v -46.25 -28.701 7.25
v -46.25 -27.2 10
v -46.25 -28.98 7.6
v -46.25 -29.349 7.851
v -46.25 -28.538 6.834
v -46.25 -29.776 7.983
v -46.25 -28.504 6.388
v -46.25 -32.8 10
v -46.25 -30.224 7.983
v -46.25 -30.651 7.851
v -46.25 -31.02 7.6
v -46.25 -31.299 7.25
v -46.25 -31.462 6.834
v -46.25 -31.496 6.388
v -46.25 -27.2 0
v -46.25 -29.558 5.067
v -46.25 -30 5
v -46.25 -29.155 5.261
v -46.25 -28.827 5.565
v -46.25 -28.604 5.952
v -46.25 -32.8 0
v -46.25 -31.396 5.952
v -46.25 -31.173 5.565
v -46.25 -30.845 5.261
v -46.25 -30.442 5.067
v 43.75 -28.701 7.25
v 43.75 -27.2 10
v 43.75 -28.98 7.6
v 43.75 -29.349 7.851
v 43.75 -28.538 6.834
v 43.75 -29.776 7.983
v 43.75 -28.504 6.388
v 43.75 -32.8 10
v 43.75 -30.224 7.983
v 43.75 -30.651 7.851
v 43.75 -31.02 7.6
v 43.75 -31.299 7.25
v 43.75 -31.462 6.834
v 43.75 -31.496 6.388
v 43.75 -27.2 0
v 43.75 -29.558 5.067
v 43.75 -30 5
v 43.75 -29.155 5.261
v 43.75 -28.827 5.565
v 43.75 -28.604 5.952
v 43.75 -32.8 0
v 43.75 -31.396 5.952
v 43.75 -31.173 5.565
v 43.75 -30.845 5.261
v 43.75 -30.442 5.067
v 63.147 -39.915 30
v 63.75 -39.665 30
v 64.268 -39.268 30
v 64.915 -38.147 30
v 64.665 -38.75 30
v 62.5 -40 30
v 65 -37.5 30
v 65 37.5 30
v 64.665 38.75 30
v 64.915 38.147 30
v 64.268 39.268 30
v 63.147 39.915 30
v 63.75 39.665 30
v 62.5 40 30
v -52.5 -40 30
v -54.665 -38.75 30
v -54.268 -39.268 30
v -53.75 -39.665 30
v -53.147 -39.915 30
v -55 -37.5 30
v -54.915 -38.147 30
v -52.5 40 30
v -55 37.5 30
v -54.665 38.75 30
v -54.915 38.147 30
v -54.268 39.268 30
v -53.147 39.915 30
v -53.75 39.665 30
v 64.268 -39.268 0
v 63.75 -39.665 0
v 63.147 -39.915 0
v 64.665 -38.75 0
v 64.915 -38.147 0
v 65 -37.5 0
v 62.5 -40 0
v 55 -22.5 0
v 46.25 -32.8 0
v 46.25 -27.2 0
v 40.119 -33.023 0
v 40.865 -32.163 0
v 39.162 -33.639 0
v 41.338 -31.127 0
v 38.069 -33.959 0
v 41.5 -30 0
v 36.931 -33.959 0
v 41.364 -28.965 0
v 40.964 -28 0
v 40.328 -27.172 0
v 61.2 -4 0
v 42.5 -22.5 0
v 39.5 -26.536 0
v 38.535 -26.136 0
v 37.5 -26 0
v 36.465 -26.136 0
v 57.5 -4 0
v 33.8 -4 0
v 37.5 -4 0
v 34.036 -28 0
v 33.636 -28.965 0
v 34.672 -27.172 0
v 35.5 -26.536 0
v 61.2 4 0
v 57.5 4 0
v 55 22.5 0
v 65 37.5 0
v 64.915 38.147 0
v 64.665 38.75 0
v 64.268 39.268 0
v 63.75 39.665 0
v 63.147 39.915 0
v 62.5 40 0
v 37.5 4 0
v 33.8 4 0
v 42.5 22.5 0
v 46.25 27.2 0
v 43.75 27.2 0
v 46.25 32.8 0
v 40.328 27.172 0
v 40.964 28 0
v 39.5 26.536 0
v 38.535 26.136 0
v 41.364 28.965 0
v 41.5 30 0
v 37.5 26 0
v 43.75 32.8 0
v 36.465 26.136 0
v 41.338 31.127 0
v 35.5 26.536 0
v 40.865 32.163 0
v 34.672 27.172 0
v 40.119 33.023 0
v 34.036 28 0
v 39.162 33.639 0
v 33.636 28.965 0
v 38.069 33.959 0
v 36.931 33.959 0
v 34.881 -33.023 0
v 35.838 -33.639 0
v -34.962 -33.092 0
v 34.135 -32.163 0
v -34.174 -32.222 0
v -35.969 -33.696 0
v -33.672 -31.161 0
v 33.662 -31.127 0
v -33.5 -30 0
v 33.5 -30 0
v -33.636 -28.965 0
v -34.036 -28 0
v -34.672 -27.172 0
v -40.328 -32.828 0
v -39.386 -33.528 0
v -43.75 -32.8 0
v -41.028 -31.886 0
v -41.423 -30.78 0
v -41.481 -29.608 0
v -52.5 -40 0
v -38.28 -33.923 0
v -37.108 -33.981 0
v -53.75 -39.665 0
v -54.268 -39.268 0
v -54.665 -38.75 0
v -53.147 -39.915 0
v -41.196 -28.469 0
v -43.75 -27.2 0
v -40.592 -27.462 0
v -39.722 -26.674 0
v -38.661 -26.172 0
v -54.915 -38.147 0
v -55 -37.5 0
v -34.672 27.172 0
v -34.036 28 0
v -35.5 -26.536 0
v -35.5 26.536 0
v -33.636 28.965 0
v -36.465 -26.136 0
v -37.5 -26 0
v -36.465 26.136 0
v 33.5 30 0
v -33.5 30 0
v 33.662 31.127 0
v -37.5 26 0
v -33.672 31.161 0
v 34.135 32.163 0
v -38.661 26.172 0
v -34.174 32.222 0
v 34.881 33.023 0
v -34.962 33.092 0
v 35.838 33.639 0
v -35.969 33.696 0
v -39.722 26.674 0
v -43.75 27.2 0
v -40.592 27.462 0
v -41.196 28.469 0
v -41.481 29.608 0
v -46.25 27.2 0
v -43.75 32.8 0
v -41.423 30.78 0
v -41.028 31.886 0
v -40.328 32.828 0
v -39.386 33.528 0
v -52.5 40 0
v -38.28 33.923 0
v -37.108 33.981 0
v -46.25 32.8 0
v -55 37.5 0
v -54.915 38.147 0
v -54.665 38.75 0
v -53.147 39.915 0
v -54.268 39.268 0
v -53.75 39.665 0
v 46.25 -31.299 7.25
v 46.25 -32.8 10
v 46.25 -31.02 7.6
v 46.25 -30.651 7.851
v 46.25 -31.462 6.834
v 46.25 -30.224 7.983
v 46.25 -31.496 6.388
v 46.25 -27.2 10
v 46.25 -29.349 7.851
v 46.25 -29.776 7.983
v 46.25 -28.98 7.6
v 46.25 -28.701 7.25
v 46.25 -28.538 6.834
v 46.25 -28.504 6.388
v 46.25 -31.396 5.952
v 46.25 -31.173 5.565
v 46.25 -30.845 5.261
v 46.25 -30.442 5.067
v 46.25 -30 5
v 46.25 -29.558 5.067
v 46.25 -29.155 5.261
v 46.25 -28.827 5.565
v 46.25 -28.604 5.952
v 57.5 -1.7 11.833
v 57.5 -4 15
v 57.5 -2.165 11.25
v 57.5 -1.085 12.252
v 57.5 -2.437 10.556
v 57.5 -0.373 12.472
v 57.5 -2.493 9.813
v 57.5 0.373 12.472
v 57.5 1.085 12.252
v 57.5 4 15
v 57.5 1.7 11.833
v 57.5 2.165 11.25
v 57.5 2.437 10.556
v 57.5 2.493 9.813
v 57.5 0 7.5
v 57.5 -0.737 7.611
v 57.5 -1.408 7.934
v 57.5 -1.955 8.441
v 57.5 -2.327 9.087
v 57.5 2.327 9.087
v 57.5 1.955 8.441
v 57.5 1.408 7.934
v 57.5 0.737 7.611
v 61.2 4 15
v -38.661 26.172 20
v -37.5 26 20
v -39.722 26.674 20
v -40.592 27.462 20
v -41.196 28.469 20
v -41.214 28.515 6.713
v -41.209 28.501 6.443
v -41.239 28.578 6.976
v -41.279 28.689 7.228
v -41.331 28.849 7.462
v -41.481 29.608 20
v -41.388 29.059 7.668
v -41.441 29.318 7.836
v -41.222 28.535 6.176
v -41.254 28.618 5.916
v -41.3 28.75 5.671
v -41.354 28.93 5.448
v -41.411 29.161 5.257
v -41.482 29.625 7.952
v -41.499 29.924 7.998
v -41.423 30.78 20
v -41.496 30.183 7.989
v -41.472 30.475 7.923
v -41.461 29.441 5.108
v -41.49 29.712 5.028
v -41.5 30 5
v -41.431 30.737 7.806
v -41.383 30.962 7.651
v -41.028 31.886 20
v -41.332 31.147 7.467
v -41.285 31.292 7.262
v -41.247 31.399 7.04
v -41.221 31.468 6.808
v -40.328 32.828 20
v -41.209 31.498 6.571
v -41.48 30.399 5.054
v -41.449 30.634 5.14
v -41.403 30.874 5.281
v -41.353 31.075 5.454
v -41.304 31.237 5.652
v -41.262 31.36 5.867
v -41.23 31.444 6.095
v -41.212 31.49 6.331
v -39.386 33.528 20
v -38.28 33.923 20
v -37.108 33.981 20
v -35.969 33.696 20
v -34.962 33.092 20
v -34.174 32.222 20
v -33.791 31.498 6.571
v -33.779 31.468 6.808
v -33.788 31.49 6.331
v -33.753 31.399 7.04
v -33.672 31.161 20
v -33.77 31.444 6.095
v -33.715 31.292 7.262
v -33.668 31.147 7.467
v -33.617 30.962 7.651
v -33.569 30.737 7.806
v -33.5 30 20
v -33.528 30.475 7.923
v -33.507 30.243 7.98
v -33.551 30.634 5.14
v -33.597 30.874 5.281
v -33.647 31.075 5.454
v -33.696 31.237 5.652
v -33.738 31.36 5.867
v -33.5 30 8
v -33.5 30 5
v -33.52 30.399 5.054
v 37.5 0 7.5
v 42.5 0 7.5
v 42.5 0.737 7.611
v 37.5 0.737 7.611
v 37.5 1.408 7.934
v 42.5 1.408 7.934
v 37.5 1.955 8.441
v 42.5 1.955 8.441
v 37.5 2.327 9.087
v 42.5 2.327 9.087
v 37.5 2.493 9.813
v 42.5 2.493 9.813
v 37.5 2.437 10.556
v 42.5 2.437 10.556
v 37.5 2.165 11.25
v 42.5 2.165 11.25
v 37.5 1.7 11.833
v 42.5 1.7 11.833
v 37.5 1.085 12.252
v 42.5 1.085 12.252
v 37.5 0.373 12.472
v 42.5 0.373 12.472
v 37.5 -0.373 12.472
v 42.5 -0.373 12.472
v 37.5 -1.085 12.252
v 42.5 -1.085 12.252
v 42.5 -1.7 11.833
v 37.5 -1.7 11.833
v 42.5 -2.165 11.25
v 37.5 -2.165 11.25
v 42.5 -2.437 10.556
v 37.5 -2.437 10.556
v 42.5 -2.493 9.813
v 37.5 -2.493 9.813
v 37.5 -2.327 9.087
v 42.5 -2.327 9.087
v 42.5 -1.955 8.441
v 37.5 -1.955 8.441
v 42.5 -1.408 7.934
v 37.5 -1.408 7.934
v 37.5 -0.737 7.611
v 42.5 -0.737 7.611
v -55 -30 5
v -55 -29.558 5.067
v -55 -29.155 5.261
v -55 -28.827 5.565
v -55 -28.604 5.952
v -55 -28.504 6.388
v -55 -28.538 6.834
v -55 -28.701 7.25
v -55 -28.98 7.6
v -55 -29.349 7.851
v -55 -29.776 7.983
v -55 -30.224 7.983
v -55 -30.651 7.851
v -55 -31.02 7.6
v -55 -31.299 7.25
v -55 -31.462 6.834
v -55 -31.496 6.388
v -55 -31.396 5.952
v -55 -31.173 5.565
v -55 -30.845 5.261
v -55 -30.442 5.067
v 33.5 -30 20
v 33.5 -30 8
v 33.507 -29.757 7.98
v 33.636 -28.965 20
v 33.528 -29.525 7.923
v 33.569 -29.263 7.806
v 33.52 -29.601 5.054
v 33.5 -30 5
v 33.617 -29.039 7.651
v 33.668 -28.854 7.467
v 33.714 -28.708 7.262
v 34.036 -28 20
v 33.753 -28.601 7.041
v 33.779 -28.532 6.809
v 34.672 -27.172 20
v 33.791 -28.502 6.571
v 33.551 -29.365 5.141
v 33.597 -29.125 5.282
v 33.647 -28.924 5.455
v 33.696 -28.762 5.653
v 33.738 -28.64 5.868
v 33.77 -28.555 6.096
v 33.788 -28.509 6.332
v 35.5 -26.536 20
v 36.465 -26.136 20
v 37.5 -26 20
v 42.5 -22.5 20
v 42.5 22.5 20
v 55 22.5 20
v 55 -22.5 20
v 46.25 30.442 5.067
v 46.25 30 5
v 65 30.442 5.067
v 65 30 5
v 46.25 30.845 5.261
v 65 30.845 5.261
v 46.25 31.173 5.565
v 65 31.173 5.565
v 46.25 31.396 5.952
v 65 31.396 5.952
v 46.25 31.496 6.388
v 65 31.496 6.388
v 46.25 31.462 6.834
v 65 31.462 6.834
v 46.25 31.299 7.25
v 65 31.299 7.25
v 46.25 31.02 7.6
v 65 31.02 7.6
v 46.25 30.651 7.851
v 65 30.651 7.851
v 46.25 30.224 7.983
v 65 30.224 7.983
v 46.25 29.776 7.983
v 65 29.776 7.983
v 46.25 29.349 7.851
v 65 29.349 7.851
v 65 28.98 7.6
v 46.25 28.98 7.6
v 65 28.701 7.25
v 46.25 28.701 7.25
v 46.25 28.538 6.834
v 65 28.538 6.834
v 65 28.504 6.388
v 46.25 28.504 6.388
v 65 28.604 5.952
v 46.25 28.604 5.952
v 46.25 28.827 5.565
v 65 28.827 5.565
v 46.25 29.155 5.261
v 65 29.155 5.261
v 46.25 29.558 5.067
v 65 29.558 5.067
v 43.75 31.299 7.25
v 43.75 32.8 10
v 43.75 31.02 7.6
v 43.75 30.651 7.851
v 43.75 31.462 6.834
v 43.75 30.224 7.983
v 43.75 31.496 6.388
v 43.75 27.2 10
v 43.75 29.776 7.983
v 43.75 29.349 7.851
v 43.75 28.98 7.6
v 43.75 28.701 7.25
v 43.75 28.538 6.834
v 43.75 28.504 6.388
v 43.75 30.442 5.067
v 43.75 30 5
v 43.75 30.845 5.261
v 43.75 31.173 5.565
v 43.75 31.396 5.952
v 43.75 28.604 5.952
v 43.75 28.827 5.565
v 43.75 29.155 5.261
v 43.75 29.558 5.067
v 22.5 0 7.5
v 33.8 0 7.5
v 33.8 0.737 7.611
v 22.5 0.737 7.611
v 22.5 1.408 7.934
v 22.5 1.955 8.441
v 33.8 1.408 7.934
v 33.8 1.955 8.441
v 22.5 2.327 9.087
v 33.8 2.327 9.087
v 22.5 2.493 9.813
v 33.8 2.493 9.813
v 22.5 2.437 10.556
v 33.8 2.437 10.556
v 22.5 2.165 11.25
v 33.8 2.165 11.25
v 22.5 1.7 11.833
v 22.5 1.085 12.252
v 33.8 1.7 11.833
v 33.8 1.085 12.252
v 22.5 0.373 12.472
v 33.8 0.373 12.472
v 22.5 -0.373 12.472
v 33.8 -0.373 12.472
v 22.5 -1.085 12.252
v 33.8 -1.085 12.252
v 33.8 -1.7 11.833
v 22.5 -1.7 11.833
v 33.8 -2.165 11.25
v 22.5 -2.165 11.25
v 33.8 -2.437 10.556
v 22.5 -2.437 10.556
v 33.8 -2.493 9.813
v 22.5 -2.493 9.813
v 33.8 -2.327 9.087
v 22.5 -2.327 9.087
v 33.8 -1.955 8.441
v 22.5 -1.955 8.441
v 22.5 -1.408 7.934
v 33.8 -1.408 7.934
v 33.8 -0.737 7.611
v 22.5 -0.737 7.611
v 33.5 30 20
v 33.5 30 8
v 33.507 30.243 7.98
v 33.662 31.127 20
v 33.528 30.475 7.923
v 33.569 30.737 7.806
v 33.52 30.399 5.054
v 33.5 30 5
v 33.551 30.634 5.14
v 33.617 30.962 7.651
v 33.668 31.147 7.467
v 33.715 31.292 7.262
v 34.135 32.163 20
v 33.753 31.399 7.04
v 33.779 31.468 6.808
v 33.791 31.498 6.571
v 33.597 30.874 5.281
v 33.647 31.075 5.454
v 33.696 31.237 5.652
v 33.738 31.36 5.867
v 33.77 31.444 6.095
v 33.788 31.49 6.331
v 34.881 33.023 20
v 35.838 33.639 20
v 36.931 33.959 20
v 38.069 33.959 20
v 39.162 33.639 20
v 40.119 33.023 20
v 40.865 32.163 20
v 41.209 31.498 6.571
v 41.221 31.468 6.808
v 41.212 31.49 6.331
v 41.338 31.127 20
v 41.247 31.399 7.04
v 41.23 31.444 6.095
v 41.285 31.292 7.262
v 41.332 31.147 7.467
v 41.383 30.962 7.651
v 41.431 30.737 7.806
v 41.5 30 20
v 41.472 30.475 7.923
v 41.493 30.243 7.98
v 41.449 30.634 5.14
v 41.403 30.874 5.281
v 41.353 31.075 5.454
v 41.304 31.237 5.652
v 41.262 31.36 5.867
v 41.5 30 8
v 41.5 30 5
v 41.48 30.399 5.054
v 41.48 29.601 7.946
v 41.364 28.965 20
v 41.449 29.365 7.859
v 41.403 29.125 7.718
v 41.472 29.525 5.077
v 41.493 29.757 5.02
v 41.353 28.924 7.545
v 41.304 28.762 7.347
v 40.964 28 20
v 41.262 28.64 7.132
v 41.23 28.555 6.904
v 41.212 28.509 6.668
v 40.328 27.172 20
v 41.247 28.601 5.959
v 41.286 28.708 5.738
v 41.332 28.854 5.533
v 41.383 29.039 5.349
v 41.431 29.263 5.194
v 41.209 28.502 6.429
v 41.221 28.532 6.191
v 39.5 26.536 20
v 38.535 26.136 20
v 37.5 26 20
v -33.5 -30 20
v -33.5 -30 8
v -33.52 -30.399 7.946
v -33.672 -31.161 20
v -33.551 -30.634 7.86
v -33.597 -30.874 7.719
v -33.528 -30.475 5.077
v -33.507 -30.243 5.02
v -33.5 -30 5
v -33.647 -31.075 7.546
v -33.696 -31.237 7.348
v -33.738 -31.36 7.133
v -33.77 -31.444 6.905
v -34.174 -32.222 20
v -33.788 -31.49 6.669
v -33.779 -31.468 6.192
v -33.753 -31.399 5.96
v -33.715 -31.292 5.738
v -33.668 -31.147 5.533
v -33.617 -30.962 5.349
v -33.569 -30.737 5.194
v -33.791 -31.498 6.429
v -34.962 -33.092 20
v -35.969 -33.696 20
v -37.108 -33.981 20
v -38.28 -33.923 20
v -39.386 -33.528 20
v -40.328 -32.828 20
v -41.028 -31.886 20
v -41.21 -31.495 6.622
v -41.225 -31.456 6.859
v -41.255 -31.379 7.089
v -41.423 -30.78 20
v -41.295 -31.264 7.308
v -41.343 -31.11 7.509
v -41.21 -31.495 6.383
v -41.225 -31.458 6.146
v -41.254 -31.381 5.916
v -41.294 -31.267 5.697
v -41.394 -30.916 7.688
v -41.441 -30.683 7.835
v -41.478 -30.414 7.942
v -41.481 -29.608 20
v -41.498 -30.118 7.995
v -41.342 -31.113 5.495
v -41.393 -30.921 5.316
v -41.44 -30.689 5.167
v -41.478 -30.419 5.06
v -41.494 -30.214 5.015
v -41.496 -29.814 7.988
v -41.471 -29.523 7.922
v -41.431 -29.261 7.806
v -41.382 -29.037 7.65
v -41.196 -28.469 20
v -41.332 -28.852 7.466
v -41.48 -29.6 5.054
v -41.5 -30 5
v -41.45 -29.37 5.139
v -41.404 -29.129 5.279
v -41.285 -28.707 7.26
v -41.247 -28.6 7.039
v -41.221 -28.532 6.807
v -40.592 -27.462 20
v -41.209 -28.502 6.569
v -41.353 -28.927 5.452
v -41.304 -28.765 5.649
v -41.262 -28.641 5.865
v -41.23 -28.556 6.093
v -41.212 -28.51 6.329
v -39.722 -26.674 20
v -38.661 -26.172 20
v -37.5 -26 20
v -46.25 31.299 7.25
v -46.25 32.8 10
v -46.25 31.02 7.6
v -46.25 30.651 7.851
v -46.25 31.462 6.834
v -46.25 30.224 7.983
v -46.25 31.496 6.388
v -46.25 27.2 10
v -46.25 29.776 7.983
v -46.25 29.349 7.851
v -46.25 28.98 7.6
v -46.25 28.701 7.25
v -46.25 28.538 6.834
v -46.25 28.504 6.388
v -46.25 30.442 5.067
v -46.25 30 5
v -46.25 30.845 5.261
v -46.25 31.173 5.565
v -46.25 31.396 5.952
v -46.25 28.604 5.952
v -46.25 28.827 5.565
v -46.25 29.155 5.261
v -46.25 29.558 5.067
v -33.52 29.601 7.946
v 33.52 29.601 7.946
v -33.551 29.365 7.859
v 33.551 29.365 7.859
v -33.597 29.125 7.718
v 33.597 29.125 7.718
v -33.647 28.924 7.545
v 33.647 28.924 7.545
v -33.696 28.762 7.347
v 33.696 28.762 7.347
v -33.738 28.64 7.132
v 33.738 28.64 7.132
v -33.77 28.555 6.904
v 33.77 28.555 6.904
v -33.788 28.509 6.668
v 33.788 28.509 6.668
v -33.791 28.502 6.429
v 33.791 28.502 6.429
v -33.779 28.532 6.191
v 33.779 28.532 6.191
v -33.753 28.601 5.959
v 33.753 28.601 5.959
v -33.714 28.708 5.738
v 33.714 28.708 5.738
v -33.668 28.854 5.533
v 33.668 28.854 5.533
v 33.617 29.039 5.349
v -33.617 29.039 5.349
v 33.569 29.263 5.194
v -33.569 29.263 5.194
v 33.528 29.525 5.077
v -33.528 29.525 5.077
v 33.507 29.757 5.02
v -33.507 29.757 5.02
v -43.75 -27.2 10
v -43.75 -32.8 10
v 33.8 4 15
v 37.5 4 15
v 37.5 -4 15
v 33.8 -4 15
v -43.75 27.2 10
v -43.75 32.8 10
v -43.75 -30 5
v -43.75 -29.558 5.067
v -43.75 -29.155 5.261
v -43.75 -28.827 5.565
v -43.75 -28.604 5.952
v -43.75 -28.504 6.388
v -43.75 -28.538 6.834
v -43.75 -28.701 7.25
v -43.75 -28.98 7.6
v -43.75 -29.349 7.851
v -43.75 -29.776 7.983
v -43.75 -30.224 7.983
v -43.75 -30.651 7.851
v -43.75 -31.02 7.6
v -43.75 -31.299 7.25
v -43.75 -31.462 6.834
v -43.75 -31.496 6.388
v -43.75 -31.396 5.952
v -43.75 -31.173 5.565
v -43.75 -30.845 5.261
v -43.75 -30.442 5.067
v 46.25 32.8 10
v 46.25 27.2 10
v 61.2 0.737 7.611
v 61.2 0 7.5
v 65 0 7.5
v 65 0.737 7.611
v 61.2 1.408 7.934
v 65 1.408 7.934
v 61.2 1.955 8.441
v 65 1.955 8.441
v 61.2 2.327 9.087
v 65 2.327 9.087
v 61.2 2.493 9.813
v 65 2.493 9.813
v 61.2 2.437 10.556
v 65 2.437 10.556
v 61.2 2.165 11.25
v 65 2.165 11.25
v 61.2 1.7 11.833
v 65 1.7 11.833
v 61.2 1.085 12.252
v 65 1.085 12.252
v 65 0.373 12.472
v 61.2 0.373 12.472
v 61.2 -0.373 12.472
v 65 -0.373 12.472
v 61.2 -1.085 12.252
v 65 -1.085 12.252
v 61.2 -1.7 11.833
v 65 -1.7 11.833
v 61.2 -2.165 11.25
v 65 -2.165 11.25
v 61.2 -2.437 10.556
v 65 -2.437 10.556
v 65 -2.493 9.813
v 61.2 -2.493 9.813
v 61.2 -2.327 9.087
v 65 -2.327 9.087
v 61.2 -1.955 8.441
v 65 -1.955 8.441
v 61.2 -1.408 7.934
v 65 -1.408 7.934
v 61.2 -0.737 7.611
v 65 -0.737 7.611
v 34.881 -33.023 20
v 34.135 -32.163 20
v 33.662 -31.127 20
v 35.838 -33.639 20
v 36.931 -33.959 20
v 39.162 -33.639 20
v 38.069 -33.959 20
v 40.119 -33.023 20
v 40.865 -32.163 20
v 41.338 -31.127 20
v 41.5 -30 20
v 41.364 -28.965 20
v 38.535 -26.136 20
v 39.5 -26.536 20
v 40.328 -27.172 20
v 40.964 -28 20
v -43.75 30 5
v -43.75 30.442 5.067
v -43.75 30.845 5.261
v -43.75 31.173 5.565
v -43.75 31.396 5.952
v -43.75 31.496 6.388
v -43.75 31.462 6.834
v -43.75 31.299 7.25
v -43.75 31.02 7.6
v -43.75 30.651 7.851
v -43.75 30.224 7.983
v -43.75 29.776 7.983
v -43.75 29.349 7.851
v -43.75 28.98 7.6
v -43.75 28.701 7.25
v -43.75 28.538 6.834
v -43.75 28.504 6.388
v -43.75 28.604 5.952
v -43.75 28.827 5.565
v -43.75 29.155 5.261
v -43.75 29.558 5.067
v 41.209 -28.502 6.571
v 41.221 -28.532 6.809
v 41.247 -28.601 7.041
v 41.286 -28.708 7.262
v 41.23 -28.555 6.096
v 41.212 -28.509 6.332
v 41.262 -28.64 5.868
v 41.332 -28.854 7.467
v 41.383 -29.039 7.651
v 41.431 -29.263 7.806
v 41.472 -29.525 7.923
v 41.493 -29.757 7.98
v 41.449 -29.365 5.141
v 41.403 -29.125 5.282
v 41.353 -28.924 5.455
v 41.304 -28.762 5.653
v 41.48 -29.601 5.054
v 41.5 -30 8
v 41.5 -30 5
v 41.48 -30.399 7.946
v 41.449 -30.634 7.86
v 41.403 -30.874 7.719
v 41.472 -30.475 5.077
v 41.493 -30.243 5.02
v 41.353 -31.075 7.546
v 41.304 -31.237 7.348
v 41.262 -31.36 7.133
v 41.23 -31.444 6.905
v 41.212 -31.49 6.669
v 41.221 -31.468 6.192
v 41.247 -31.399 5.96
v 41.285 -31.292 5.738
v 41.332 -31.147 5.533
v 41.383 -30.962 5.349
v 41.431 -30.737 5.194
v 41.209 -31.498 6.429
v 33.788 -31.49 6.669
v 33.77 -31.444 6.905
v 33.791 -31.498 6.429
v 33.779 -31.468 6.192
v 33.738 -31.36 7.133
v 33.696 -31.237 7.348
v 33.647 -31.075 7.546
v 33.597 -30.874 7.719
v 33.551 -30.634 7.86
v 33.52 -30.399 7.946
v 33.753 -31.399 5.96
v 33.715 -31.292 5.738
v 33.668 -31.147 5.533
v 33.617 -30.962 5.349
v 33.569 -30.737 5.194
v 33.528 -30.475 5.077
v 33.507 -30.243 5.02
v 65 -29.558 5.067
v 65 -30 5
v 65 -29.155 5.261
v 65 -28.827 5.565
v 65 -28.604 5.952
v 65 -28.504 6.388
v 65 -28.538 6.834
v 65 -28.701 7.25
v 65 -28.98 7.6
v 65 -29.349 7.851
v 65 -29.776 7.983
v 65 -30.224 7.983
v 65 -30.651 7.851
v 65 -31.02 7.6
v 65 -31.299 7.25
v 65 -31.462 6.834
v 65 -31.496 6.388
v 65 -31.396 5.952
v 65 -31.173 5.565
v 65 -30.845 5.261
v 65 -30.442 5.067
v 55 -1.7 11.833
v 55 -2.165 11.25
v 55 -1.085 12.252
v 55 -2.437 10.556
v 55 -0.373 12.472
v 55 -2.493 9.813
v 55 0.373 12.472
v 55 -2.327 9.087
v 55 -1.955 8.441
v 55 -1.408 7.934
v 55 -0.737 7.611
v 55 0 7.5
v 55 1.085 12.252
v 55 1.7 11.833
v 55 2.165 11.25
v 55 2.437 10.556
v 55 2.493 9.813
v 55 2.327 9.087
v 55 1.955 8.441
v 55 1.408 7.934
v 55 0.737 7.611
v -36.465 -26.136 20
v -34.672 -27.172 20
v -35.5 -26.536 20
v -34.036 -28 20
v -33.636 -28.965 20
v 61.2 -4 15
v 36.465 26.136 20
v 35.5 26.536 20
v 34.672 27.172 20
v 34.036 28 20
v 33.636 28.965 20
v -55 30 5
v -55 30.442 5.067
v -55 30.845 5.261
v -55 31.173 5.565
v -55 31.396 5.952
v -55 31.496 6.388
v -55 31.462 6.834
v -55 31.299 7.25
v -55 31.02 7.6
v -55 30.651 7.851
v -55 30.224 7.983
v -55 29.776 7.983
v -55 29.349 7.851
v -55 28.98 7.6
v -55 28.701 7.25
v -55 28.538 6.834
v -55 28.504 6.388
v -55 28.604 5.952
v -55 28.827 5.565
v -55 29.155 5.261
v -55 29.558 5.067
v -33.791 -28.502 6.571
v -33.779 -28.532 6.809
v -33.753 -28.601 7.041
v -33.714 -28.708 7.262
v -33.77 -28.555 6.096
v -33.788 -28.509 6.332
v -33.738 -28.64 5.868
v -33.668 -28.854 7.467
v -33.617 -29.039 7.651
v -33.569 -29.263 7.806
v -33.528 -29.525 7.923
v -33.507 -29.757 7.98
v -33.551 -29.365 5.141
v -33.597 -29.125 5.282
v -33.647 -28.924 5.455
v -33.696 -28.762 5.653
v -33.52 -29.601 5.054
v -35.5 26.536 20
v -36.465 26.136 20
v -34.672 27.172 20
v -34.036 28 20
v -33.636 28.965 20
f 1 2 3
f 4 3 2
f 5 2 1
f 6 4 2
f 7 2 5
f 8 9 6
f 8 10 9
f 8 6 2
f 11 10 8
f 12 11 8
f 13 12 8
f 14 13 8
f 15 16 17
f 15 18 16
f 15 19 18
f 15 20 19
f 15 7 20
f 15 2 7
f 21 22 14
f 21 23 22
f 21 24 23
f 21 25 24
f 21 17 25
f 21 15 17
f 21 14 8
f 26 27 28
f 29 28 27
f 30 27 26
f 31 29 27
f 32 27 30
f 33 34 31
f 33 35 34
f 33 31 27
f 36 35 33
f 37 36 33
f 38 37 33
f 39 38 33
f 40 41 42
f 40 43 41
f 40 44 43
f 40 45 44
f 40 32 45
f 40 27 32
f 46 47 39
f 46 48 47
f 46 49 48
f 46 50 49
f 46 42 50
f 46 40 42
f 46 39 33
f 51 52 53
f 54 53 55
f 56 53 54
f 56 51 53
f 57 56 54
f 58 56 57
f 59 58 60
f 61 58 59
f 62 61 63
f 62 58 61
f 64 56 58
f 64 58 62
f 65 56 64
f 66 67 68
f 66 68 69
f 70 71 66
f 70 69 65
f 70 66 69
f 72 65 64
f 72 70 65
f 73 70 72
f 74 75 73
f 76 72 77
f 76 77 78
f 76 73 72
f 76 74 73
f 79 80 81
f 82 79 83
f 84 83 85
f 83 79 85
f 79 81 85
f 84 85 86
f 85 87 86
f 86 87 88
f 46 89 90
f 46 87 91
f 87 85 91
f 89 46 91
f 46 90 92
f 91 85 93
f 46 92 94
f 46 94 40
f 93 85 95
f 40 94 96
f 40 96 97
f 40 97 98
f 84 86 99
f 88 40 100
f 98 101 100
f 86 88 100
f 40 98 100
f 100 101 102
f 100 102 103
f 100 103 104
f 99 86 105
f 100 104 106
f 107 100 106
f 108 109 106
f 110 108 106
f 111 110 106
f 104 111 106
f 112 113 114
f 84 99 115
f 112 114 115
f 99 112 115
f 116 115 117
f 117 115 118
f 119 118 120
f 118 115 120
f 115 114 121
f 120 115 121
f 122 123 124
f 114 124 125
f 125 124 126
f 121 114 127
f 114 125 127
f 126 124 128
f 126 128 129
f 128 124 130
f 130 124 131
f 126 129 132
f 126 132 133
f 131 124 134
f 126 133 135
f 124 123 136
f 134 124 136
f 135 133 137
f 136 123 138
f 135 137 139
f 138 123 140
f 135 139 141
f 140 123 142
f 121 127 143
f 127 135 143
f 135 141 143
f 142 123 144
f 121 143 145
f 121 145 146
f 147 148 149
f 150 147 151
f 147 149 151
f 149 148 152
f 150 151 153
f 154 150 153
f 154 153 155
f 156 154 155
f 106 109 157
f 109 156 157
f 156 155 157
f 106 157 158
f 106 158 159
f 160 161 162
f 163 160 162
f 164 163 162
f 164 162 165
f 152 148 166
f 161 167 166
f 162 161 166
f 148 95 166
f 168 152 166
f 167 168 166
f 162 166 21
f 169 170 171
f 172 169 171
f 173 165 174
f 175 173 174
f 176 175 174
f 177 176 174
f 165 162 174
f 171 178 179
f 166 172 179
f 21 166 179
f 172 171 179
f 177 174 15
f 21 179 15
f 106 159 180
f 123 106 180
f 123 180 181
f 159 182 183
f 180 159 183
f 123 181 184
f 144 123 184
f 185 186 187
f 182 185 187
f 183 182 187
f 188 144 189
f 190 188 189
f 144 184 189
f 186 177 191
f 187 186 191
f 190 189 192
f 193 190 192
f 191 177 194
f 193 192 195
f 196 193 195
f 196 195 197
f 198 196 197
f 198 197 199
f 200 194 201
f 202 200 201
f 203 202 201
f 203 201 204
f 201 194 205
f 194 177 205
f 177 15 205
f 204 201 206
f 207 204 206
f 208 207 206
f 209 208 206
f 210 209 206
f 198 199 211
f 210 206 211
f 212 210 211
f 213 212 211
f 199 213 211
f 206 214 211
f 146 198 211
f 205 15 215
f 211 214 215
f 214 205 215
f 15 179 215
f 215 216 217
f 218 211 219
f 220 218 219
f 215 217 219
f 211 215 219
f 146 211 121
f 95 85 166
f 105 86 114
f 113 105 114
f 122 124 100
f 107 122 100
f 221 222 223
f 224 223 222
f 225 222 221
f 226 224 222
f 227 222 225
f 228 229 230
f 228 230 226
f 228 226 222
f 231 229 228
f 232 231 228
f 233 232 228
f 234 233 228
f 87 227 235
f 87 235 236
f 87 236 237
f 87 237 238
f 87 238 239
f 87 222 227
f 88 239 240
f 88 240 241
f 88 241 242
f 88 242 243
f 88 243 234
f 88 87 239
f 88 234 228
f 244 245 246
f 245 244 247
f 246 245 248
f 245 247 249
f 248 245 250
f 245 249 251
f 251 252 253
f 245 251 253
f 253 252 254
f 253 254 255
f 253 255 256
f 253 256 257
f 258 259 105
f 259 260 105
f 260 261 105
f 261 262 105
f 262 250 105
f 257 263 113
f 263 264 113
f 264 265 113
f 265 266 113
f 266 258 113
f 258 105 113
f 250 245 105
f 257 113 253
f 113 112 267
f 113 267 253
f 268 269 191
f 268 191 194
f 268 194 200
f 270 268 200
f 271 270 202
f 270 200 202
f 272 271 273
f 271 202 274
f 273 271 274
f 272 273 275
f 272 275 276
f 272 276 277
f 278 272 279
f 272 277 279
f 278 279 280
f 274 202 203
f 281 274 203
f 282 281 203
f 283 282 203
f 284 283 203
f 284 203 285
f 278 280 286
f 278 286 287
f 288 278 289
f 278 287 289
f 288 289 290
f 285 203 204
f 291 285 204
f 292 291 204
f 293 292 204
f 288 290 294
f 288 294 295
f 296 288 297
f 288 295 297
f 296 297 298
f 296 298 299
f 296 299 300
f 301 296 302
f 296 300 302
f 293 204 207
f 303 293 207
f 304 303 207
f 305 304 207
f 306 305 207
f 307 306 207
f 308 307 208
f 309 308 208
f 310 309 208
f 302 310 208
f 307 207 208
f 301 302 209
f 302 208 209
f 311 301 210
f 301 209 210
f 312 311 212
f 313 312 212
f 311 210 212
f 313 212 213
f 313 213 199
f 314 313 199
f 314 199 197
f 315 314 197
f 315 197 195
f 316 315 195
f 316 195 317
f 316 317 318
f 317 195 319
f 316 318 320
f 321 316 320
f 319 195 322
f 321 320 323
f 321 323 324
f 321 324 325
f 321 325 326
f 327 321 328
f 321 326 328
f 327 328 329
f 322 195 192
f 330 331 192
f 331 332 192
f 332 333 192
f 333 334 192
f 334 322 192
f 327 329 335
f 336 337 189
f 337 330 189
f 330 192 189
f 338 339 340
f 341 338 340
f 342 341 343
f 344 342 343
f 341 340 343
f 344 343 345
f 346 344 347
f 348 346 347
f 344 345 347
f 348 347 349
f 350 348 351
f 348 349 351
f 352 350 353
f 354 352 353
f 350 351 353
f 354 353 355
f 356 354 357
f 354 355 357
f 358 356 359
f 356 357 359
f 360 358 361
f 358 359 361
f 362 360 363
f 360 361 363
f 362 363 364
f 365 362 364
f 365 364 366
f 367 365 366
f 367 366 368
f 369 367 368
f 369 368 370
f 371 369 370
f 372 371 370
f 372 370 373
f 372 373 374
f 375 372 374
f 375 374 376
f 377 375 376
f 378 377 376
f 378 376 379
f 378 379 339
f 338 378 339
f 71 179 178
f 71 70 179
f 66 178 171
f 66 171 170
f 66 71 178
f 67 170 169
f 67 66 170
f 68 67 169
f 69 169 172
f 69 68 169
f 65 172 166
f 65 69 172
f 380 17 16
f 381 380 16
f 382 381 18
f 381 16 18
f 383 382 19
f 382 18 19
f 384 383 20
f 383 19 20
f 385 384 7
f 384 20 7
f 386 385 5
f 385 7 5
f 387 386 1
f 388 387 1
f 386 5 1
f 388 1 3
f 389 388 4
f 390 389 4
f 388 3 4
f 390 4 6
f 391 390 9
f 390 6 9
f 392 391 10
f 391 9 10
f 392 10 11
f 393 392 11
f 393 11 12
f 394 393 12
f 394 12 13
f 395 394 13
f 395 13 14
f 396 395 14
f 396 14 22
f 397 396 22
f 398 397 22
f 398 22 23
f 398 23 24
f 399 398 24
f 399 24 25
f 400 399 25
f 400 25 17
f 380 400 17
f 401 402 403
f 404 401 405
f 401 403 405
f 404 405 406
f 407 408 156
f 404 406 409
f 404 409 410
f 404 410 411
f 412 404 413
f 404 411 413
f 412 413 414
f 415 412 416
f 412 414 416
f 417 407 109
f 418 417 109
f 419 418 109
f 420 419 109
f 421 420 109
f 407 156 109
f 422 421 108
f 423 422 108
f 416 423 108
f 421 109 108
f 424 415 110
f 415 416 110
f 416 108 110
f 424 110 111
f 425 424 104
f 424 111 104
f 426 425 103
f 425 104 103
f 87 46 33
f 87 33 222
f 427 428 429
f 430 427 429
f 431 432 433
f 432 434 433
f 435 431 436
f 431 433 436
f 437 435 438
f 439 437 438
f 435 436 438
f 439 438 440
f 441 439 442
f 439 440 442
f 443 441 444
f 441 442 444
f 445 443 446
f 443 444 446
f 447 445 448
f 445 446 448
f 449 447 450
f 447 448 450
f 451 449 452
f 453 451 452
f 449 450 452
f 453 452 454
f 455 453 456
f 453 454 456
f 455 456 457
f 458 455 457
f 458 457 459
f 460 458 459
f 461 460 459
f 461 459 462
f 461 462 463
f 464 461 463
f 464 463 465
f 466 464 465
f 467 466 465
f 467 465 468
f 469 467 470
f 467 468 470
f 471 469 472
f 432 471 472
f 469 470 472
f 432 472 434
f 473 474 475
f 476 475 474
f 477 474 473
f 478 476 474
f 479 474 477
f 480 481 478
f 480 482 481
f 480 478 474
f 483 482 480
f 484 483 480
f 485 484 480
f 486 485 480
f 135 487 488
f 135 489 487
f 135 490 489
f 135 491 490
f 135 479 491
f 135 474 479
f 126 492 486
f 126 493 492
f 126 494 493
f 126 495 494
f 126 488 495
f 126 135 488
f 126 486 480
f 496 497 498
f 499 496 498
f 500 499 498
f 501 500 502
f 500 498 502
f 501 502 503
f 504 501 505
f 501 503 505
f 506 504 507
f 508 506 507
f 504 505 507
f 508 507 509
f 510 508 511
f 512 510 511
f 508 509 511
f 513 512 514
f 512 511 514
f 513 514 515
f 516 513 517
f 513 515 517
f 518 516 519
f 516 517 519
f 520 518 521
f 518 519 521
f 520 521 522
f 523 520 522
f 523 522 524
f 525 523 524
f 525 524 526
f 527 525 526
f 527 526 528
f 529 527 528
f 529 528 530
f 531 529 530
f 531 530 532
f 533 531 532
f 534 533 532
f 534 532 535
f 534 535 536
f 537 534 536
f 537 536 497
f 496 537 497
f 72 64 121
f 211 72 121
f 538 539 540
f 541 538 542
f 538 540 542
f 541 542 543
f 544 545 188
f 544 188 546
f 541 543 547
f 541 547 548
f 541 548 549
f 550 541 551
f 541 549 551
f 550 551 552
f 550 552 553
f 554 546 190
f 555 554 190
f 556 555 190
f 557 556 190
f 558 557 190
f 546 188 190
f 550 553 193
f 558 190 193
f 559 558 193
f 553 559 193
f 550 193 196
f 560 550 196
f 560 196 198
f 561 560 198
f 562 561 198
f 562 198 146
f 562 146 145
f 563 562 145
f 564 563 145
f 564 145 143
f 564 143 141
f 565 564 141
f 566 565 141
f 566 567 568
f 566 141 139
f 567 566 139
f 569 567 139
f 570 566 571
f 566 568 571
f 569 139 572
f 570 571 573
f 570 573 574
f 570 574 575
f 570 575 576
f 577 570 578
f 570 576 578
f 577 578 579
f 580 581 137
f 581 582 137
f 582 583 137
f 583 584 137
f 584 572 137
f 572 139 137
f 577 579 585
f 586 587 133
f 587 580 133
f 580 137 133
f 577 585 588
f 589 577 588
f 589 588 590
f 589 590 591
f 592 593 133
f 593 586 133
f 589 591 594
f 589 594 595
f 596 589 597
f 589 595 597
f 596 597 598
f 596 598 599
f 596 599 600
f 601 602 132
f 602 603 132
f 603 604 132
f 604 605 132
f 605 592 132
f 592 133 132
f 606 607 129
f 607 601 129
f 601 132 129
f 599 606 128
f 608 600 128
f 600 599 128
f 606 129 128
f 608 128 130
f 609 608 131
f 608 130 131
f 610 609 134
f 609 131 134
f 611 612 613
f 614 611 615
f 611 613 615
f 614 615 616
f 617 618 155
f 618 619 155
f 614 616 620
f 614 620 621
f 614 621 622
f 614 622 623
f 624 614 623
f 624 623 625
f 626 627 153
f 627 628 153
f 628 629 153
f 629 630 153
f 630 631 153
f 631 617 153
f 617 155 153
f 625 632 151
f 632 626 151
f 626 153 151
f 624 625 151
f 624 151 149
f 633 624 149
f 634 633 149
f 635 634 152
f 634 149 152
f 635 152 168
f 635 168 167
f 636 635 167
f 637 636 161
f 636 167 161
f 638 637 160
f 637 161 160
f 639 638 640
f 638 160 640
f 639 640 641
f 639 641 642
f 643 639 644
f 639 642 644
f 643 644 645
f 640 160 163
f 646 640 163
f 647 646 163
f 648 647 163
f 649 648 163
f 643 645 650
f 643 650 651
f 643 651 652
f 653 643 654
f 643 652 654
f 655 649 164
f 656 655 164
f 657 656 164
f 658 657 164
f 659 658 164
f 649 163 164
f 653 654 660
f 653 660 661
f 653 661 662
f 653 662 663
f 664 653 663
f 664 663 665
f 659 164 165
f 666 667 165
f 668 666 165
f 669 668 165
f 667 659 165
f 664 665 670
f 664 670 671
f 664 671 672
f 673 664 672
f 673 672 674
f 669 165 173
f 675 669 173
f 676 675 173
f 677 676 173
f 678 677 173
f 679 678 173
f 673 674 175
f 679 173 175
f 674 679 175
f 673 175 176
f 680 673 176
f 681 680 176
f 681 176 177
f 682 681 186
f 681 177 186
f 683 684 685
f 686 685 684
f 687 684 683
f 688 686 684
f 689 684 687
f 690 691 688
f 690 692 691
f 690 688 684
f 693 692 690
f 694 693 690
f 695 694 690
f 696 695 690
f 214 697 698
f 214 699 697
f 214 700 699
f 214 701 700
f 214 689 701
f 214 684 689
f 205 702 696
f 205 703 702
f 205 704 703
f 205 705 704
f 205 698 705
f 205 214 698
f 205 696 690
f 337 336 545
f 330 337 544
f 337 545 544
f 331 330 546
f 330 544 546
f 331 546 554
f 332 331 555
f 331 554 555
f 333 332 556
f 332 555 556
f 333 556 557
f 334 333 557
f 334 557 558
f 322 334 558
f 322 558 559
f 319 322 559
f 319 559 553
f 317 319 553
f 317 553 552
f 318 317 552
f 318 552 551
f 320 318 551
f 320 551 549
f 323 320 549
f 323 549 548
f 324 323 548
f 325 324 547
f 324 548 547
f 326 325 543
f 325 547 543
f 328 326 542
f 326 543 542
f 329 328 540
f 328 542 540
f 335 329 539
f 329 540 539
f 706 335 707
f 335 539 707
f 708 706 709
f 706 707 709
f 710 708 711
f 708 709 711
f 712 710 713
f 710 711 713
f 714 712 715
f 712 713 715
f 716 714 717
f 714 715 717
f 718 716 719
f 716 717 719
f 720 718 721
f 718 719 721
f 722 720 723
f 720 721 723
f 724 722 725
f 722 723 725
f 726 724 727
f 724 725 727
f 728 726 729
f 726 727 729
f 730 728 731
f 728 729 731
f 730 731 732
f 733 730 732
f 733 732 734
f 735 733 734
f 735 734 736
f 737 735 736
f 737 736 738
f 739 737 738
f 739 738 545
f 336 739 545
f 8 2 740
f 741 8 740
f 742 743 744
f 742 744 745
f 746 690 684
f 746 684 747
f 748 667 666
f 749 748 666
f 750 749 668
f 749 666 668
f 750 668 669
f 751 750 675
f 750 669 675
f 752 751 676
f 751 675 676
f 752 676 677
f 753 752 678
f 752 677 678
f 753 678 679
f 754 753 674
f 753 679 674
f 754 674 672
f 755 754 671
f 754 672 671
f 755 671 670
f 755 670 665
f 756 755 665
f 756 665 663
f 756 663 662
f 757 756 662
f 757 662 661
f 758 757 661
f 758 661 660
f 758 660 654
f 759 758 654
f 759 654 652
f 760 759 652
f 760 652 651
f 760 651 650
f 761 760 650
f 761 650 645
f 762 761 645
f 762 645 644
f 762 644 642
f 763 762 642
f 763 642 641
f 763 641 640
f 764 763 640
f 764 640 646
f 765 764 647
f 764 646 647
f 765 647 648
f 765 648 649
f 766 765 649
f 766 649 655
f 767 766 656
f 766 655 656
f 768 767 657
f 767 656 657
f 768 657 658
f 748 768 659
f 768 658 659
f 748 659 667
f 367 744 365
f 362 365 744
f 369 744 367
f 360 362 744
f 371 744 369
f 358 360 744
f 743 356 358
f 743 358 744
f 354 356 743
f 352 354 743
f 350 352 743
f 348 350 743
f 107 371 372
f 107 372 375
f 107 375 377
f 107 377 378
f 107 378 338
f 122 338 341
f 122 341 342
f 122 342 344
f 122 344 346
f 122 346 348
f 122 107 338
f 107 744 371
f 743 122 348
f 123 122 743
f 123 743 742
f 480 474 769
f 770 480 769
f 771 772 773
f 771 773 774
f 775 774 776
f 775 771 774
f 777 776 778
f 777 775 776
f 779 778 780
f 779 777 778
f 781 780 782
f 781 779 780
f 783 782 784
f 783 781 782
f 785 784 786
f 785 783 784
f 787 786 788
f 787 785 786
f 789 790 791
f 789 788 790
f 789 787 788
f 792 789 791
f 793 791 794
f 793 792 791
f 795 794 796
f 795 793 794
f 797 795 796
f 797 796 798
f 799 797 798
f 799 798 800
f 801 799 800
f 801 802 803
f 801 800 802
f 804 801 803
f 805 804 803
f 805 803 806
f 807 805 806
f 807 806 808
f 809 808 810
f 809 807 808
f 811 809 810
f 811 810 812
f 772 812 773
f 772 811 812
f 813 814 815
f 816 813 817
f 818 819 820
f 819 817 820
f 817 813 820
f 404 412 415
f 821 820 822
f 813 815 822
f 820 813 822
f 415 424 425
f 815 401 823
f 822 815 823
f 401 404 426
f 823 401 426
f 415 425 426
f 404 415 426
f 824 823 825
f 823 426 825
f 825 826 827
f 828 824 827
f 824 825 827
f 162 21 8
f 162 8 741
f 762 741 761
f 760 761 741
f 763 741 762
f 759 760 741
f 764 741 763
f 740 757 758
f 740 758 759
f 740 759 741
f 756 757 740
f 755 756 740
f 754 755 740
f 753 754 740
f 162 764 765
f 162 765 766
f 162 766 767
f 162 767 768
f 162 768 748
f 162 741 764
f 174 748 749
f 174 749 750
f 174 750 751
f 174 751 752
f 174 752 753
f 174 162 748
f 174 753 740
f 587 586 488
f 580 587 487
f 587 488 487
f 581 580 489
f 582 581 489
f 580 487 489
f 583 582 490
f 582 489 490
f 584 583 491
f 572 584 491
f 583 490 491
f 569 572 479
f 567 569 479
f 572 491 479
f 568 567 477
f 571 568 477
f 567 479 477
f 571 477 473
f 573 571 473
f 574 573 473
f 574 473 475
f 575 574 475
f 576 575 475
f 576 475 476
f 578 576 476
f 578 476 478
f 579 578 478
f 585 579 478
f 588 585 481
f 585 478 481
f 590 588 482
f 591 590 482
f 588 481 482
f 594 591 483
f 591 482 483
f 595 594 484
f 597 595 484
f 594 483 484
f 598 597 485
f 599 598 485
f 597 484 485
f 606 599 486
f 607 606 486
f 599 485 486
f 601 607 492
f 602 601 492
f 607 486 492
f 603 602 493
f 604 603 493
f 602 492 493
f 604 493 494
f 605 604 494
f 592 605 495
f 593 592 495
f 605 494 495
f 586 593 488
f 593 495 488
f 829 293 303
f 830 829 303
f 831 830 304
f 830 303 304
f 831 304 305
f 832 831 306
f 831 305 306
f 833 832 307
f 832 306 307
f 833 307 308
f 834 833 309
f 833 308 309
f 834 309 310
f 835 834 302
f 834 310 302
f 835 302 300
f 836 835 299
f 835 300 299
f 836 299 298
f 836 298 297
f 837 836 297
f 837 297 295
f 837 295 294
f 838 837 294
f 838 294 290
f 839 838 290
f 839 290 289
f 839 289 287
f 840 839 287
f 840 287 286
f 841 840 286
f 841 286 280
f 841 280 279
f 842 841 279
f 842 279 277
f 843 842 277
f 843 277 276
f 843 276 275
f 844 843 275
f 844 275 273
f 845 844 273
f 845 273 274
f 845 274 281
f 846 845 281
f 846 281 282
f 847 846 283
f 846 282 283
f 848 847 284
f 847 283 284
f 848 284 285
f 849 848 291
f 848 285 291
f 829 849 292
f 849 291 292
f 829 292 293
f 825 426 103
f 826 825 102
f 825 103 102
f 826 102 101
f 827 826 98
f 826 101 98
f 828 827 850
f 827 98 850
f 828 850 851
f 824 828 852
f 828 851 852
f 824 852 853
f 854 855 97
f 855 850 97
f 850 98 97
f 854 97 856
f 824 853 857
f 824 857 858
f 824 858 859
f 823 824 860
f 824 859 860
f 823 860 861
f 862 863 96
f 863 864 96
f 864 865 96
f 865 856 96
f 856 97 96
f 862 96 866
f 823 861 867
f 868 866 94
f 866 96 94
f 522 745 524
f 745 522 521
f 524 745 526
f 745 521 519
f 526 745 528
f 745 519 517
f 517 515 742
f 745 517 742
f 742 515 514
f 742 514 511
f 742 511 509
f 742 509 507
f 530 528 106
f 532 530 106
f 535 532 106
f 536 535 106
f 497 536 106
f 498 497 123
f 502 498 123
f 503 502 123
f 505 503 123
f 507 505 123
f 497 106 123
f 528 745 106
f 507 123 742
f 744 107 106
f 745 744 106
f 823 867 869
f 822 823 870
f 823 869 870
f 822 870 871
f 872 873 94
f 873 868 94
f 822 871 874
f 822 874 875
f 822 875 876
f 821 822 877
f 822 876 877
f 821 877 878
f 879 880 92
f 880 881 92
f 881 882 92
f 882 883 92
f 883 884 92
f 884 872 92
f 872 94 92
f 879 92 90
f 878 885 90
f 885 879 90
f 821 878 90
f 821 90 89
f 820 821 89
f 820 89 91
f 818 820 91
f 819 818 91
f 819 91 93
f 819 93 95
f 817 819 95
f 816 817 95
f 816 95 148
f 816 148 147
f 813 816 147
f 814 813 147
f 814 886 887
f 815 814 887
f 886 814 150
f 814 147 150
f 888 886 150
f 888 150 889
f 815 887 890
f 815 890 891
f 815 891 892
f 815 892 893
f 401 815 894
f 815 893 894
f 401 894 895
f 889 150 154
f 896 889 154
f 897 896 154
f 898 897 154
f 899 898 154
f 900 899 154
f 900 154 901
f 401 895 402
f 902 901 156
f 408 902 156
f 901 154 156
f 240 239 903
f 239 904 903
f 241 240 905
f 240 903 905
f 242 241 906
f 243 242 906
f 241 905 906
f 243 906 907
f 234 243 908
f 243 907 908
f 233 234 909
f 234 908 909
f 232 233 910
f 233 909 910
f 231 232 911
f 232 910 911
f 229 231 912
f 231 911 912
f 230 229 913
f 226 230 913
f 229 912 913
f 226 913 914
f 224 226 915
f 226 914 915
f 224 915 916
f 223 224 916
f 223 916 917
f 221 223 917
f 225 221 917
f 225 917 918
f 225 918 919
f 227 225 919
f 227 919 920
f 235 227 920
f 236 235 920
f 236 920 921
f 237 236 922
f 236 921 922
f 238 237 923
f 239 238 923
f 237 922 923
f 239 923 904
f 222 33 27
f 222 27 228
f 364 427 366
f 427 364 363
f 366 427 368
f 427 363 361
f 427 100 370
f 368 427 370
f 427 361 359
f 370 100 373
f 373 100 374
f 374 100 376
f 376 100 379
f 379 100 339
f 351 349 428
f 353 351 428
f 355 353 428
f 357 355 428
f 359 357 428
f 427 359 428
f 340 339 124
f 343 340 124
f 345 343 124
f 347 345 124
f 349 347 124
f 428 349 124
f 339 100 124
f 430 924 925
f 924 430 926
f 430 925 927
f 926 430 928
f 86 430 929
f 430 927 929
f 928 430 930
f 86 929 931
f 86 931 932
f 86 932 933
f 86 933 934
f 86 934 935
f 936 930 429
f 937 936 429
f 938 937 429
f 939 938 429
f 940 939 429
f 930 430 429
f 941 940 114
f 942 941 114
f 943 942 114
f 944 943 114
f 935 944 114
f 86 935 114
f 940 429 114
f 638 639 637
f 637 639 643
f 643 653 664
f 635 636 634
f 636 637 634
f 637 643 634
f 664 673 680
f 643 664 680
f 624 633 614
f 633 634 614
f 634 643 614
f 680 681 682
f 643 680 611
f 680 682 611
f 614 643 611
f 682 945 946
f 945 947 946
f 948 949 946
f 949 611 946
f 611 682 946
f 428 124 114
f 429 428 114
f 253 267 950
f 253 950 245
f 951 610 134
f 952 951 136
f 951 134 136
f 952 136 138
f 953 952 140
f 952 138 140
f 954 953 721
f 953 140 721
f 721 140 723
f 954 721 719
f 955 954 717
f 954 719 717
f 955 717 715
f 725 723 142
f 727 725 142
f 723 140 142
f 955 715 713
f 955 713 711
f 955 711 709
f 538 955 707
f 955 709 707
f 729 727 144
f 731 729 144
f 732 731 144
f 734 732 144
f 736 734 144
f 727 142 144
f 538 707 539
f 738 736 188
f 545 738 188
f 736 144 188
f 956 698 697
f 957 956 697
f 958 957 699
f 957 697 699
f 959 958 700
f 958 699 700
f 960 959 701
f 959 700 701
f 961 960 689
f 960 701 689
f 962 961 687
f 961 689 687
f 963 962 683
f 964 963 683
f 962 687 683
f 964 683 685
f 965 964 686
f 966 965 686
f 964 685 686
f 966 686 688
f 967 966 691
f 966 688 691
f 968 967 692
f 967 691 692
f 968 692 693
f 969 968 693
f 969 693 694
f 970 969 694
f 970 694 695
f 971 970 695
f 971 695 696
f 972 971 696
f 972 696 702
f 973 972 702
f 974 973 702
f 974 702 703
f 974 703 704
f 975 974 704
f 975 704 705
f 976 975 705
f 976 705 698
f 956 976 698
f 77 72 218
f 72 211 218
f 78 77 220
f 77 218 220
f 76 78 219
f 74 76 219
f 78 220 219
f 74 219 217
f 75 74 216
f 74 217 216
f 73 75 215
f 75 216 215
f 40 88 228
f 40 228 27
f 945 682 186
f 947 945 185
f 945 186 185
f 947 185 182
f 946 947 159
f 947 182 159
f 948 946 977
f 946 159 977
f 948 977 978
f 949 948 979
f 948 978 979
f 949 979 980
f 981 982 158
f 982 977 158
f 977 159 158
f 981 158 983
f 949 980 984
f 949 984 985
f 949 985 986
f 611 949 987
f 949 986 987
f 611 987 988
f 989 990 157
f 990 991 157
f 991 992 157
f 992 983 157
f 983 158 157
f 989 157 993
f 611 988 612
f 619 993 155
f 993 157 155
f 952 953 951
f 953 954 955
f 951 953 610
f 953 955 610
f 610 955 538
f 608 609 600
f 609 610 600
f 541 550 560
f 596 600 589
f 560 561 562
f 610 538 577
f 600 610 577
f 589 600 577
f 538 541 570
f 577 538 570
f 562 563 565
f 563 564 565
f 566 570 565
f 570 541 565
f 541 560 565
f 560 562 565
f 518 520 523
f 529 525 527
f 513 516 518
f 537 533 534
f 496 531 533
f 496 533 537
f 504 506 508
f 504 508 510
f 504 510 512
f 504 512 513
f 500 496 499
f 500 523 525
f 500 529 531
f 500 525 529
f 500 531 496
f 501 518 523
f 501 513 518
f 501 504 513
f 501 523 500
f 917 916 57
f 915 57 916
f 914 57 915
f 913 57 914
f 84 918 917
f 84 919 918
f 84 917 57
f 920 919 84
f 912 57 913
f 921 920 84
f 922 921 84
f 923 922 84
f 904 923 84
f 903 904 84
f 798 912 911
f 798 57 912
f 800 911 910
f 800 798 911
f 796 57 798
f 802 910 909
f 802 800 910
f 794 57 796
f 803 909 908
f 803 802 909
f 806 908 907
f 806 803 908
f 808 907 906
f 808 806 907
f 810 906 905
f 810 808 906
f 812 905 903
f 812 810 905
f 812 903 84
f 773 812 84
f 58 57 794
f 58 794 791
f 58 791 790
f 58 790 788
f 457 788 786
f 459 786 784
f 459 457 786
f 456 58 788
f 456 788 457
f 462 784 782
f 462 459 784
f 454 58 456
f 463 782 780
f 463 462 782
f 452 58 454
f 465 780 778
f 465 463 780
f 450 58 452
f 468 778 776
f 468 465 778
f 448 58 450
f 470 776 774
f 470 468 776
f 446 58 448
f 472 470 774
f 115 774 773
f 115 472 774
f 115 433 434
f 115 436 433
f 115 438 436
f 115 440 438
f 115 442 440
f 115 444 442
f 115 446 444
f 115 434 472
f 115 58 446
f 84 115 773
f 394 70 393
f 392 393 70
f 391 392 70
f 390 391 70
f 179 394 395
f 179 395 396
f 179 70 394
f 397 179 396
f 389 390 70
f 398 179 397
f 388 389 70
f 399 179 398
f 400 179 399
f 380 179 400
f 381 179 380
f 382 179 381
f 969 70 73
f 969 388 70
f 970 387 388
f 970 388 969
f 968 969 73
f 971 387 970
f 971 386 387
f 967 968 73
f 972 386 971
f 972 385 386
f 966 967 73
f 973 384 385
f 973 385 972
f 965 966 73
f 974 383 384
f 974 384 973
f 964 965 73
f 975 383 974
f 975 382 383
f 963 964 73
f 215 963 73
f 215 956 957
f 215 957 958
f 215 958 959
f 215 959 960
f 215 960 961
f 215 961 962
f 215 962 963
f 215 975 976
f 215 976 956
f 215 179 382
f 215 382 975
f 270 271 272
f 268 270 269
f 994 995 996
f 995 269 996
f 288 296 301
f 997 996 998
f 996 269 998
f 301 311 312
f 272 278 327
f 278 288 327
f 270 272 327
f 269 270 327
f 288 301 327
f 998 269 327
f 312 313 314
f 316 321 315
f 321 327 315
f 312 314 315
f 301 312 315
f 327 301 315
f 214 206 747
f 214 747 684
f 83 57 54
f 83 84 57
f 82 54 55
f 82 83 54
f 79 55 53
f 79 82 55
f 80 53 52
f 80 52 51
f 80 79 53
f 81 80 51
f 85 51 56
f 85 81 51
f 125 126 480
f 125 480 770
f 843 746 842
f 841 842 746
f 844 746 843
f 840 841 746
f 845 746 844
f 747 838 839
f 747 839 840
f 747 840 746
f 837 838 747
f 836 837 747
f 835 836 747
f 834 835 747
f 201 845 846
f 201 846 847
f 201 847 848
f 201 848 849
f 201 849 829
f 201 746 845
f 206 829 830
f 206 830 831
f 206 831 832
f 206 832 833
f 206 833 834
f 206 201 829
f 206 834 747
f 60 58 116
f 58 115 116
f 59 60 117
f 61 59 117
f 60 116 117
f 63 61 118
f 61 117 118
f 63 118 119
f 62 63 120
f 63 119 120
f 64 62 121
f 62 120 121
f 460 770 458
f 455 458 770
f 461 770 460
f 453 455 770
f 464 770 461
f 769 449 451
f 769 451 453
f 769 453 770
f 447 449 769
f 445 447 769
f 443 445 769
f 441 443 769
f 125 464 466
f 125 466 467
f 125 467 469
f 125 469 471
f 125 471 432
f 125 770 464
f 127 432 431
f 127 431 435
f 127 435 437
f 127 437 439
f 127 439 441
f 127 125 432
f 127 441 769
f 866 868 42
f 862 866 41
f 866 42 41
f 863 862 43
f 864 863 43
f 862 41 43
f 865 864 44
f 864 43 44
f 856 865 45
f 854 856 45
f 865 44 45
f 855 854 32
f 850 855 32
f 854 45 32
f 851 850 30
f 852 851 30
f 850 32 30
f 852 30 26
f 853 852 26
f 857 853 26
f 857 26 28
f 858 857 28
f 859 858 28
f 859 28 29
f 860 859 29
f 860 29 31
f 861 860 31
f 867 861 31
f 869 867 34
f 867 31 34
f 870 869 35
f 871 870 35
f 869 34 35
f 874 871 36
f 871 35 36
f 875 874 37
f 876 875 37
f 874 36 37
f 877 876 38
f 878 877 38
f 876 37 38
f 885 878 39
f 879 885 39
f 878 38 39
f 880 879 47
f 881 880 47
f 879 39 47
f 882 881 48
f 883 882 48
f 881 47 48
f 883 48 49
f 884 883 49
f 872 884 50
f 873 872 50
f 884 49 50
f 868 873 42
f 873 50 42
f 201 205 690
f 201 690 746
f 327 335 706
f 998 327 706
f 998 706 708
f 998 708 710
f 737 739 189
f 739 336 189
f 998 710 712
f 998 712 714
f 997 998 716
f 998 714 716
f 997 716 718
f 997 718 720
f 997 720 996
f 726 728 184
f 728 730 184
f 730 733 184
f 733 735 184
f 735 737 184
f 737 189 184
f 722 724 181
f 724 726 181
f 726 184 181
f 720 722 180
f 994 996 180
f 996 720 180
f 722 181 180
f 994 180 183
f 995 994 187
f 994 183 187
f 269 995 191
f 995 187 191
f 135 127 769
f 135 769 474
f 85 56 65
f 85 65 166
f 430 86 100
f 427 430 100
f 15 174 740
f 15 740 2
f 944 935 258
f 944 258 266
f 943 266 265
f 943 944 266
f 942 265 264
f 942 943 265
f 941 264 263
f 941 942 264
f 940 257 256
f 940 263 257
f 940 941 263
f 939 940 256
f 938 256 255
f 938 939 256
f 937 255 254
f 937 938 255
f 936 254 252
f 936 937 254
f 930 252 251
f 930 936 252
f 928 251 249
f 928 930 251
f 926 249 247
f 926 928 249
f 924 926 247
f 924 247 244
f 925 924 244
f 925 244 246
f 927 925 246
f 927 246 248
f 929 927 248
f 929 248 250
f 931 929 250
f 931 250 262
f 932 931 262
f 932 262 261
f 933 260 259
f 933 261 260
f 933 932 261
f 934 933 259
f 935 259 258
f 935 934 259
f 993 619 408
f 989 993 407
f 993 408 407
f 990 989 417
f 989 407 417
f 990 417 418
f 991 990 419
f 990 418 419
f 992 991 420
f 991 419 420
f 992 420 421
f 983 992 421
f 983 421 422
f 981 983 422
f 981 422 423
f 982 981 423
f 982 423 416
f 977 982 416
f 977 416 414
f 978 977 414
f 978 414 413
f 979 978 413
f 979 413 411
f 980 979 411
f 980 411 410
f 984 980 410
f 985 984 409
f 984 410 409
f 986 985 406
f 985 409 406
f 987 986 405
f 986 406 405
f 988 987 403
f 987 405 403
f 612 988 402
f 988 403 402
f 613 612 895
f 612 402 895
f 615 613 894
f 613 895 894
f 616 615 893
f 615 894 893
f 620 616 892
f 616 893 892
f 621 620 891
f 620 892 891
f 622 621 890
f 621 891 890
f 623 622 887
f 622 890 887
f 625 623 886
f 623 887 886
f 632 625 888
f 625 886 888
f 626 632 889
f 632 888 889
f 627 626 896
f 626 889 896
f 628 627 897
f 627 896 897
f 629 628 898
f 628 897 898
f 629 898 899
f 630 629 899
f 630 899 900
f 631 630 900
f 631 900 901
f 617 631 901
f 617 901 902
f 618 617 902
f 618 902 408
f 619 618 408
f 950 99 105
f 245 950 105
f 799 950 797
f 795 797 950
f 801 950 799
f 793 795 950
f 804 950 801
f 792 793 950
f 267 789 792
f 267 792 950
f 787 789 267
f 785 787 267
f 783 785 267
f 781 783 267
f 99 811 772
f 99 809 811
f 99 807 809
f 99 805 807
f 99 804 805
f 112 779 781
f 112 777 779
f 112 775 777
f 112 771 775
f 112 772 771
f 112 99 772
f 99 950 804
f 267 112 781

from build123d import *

# Parameters (mm, degrees)
SKETCH2_W               = 75
SKETCH2_H               = 45
BOSS_EXTRUDE1_DEPTH     = 20
SKETCH3_W               = 110
SKETCH3_H               = 80
BOSS_EXTRUDE2_DEPTH     = 10
SKETCH4_W               = 1.25
SKETCH4_H               = 2.8
CUT_EXTRUDE1_DEPTH      = 10
SKETCH5_W               = 30
SKETCH5_H               = 80
BOSS_EXTRUDE4_DEPTH     = 10
SKETCH8_R               = 1.5
CUT_EXTRUDE2_DEPTH      = 120
SKETCH9_R               = 2.5
CUT_EXTRUDE3_DEPTH      = 40
CUT_EXTRUDE3_DEPTH_BACK = 20
SKETCH10_W              = 3.7
SKETCH10_H              = 8
CUT_EXTRUDE4_DEPTH      = 15
FILLET1_R               = 2.5


with BuildPart() as part:
    # Sketch2 → Boss-Extrude1 (new body)
    with BuildSketch(Plane.XY):
        Polygon((42.5, -22.5), (42.5, 22.5), (55, 22.5), (55, 40), (-55, 40), (-55, -40), (55, -40), (55, -22.5), align=None)
        with BuildLine():
            Line((-37.5, -22.5), (-37.5, 22.5))
            Line((-37.5, 22.5), (-37.5, 26))
            ThreePointArc((-37.5, 26), (-40.328427125, 32.828427125), (-33.5, 30))
            Line((-33.5, 30), (33.5, 30))
            ThreePointArc((33.5, 30), (37.5, 34), (41.5, 30))
            ThreePointArc((41.5, 30), (40.328427125, 27.171572875), (37.5, 26))
            Line((37.5, 26), (37.5, 22.5))
            Line((37.5, 22.5), (37.5, -22.5))
            Line((37.5, -22.5), (37.5, -26))
            ThreePointArc((37.5, -26), (40.328427125, -27.171572875), (41.5, -30))
            ThreePointArc((41.5, -30), (37.5, -34), (33.5, -30))
            Line((33.5, -30), (-33.5, -30))
            ThreePointArc((-33.5, -30), (-40.328427125, -32.828427125), (-37.5, -26))
            Line((-37.5, -26), (-37.5, -22.5))
        make_face(mode=Mode.SUBTRACT)
        with BuildLine():
            Line((-37.5, 26), (-37.5, 22.5))
            Line((-37.5, 22.5), (37.5, 22.5))
            Line((37.5, 22.5), (37.5, 26))
            ThreePointArc((37.5, 26), (34.671572875, 27.171572875), (33.5, 30))
            Line((33.5, 30), (-33.5, 30))
            ThreePointArc((-33.5, 30), (-34.671572875, 27.171572875), (-37.5, 26))
        make_face()
        Rectangle(SKETCH2_W, SKETCH2_H)
        with BuildLine():
            Line((37.5, -22.5), (-37.5, -22.5))
            Line((-37.5, -22.5), (-37.5, -26))
            ThreePointArc((-37.5, -26), (-34.671572875, -27.171572875), (-33.5, -30))
            Line((-33.5, -30), (33.5, -30))
            ThreePointArc((33.5, -30), (34.671572875, -27.171572875), (37.5, -26))
            Line((37.5, -26), (37.5, -22.5))
        make_face()
    extrude(amount=BOSS_EXTRUDE1_DEPTH)

    # Sketch3 → Boss-Extrude2 (add)
    with BuildSketch(Plane.XY.offset(20)):
        Rectangle(SKETCH3_W, SKETCH3_H)
    extrude(amount=BOSS_EXTRUDE2_DEPTH)

    # Sketch4 → Cut-Extrude1 (cut)
    with BuildSketch(Plane.XY):
        Polygon((43.75, 32.8), (43.75, 30), (45, 30), (45, 27.2), (46.25, 27.2), (46.25, 32.8), align=None)
        with Locations((44.375, 28.6)):
            Rectangle(SKETCH4_W, SKETCH4_H)
        Polygon((-45, 27.2), (-45, 30), (-43.75, 30), (-43.75, 32.8), (-46.25, 32.8), (-46.25, 27.2), align=None)
        with Locations((-44.375, 28.6)):
            Rectangle(SKETCH4_W, SKETCH4_H)
        with Locations((-44.375, -28.6)):
            Rectangle(SKETCH4_W, SKETCH4_H)
        Polygon((-45, -30), (-45, -27.2), (-46.25, -27.2), (-46.25, -32.8), (-43.75, -32.8), (-43.75, -30), align=None)
        Polygon((46.25, -27.2), (45, -27.2), (45, -30), (43.75, -30), (43.75, -32.8), (46.25, -32.8), align=None)
        with Locations((44.375, -28.6)):
            Rectangle(SKETCH4_W, SKETCH4_H)
    extrude(amount=CUT_EXTRUDE1_DEPTH, mode=Mode.SUBTRACT)

    # Sketch5 → Boss-Extrude4 (add)
    with BuildSketch(Plane(origin=(55, 0, 0), x_dir=(0, 0, -1), z_dir=(1, 0, 0))):
        with Locations((-15, 0)):
            Rectangle(SKETCH5_W, SKETCH5_H)
    extrude(amount=BOSS_EXTRUDE4_DEPTH)

    # Sketch8 → Cut-Extrude2 (cut)
    with BuildSketch(Plane(origin=(65, 0, 0), x_dir=(0, 0, -1), z_dir=(1, 0, 0))):
        with Locations((-6.5, 30)):
            Circle(SKETCH8_R)
        with Locations((-6.5, -30)):
            Circle(SKETCH8_R)
    extrude(amount=-CUT_EXTRUDE2_DEPTH, mode=Mode.SUBTRACT)

    # Sketch9 → Cut-Extrude3 (cut, two sides)
    with BuildSketch(Plane(origin=(42.5, 0, 0), x_dir=(0, 0, -1), z_dir=(1, 0, 0))) as cut_extrude3_sk:
        with Locations((-10, 0)):
            Circle(SKETCH9_R)
    extrude(amount=CUT_EXTRUDE3_DEPTH, mode=Mode.SUBTRACT)
    extrude(cut_extrude3_sk.sketch, amount=-CUT_EXTRUDE3_DEPTH_BACK, mode=Mode.SUBTRACT)

    # Sketch10 → Cut-Extrude4 (cut)
    with BuildSketch(Plane(origin=(0, 0, 0), x_dir=(-1, 0, 0), z_dir=(0, 0, -1))):
        with Locations((-35.65, 0)):
            Rectangle(SKETCH10_W, SKETCH10_H)
        with Locations((-59.35, 0)):
            Rectangle(SKETCH10_W, SKETCH10_H)
    extrude(amount=-CUT_EXTRUDE4_DEPTH, mode=Mode.SUBTRACT)

    # Fillet1
    fillet1_edges = [part.edges().sort_by_distance(p)[0] for p in [
        (65, -40, 15),
        (65, 40, 15),
        (-55, -40, 15),
        (-55, 40, 15),
    ]]
    fillet(fillet1_edges, radius=FILLET1_R)


solid = part.part
